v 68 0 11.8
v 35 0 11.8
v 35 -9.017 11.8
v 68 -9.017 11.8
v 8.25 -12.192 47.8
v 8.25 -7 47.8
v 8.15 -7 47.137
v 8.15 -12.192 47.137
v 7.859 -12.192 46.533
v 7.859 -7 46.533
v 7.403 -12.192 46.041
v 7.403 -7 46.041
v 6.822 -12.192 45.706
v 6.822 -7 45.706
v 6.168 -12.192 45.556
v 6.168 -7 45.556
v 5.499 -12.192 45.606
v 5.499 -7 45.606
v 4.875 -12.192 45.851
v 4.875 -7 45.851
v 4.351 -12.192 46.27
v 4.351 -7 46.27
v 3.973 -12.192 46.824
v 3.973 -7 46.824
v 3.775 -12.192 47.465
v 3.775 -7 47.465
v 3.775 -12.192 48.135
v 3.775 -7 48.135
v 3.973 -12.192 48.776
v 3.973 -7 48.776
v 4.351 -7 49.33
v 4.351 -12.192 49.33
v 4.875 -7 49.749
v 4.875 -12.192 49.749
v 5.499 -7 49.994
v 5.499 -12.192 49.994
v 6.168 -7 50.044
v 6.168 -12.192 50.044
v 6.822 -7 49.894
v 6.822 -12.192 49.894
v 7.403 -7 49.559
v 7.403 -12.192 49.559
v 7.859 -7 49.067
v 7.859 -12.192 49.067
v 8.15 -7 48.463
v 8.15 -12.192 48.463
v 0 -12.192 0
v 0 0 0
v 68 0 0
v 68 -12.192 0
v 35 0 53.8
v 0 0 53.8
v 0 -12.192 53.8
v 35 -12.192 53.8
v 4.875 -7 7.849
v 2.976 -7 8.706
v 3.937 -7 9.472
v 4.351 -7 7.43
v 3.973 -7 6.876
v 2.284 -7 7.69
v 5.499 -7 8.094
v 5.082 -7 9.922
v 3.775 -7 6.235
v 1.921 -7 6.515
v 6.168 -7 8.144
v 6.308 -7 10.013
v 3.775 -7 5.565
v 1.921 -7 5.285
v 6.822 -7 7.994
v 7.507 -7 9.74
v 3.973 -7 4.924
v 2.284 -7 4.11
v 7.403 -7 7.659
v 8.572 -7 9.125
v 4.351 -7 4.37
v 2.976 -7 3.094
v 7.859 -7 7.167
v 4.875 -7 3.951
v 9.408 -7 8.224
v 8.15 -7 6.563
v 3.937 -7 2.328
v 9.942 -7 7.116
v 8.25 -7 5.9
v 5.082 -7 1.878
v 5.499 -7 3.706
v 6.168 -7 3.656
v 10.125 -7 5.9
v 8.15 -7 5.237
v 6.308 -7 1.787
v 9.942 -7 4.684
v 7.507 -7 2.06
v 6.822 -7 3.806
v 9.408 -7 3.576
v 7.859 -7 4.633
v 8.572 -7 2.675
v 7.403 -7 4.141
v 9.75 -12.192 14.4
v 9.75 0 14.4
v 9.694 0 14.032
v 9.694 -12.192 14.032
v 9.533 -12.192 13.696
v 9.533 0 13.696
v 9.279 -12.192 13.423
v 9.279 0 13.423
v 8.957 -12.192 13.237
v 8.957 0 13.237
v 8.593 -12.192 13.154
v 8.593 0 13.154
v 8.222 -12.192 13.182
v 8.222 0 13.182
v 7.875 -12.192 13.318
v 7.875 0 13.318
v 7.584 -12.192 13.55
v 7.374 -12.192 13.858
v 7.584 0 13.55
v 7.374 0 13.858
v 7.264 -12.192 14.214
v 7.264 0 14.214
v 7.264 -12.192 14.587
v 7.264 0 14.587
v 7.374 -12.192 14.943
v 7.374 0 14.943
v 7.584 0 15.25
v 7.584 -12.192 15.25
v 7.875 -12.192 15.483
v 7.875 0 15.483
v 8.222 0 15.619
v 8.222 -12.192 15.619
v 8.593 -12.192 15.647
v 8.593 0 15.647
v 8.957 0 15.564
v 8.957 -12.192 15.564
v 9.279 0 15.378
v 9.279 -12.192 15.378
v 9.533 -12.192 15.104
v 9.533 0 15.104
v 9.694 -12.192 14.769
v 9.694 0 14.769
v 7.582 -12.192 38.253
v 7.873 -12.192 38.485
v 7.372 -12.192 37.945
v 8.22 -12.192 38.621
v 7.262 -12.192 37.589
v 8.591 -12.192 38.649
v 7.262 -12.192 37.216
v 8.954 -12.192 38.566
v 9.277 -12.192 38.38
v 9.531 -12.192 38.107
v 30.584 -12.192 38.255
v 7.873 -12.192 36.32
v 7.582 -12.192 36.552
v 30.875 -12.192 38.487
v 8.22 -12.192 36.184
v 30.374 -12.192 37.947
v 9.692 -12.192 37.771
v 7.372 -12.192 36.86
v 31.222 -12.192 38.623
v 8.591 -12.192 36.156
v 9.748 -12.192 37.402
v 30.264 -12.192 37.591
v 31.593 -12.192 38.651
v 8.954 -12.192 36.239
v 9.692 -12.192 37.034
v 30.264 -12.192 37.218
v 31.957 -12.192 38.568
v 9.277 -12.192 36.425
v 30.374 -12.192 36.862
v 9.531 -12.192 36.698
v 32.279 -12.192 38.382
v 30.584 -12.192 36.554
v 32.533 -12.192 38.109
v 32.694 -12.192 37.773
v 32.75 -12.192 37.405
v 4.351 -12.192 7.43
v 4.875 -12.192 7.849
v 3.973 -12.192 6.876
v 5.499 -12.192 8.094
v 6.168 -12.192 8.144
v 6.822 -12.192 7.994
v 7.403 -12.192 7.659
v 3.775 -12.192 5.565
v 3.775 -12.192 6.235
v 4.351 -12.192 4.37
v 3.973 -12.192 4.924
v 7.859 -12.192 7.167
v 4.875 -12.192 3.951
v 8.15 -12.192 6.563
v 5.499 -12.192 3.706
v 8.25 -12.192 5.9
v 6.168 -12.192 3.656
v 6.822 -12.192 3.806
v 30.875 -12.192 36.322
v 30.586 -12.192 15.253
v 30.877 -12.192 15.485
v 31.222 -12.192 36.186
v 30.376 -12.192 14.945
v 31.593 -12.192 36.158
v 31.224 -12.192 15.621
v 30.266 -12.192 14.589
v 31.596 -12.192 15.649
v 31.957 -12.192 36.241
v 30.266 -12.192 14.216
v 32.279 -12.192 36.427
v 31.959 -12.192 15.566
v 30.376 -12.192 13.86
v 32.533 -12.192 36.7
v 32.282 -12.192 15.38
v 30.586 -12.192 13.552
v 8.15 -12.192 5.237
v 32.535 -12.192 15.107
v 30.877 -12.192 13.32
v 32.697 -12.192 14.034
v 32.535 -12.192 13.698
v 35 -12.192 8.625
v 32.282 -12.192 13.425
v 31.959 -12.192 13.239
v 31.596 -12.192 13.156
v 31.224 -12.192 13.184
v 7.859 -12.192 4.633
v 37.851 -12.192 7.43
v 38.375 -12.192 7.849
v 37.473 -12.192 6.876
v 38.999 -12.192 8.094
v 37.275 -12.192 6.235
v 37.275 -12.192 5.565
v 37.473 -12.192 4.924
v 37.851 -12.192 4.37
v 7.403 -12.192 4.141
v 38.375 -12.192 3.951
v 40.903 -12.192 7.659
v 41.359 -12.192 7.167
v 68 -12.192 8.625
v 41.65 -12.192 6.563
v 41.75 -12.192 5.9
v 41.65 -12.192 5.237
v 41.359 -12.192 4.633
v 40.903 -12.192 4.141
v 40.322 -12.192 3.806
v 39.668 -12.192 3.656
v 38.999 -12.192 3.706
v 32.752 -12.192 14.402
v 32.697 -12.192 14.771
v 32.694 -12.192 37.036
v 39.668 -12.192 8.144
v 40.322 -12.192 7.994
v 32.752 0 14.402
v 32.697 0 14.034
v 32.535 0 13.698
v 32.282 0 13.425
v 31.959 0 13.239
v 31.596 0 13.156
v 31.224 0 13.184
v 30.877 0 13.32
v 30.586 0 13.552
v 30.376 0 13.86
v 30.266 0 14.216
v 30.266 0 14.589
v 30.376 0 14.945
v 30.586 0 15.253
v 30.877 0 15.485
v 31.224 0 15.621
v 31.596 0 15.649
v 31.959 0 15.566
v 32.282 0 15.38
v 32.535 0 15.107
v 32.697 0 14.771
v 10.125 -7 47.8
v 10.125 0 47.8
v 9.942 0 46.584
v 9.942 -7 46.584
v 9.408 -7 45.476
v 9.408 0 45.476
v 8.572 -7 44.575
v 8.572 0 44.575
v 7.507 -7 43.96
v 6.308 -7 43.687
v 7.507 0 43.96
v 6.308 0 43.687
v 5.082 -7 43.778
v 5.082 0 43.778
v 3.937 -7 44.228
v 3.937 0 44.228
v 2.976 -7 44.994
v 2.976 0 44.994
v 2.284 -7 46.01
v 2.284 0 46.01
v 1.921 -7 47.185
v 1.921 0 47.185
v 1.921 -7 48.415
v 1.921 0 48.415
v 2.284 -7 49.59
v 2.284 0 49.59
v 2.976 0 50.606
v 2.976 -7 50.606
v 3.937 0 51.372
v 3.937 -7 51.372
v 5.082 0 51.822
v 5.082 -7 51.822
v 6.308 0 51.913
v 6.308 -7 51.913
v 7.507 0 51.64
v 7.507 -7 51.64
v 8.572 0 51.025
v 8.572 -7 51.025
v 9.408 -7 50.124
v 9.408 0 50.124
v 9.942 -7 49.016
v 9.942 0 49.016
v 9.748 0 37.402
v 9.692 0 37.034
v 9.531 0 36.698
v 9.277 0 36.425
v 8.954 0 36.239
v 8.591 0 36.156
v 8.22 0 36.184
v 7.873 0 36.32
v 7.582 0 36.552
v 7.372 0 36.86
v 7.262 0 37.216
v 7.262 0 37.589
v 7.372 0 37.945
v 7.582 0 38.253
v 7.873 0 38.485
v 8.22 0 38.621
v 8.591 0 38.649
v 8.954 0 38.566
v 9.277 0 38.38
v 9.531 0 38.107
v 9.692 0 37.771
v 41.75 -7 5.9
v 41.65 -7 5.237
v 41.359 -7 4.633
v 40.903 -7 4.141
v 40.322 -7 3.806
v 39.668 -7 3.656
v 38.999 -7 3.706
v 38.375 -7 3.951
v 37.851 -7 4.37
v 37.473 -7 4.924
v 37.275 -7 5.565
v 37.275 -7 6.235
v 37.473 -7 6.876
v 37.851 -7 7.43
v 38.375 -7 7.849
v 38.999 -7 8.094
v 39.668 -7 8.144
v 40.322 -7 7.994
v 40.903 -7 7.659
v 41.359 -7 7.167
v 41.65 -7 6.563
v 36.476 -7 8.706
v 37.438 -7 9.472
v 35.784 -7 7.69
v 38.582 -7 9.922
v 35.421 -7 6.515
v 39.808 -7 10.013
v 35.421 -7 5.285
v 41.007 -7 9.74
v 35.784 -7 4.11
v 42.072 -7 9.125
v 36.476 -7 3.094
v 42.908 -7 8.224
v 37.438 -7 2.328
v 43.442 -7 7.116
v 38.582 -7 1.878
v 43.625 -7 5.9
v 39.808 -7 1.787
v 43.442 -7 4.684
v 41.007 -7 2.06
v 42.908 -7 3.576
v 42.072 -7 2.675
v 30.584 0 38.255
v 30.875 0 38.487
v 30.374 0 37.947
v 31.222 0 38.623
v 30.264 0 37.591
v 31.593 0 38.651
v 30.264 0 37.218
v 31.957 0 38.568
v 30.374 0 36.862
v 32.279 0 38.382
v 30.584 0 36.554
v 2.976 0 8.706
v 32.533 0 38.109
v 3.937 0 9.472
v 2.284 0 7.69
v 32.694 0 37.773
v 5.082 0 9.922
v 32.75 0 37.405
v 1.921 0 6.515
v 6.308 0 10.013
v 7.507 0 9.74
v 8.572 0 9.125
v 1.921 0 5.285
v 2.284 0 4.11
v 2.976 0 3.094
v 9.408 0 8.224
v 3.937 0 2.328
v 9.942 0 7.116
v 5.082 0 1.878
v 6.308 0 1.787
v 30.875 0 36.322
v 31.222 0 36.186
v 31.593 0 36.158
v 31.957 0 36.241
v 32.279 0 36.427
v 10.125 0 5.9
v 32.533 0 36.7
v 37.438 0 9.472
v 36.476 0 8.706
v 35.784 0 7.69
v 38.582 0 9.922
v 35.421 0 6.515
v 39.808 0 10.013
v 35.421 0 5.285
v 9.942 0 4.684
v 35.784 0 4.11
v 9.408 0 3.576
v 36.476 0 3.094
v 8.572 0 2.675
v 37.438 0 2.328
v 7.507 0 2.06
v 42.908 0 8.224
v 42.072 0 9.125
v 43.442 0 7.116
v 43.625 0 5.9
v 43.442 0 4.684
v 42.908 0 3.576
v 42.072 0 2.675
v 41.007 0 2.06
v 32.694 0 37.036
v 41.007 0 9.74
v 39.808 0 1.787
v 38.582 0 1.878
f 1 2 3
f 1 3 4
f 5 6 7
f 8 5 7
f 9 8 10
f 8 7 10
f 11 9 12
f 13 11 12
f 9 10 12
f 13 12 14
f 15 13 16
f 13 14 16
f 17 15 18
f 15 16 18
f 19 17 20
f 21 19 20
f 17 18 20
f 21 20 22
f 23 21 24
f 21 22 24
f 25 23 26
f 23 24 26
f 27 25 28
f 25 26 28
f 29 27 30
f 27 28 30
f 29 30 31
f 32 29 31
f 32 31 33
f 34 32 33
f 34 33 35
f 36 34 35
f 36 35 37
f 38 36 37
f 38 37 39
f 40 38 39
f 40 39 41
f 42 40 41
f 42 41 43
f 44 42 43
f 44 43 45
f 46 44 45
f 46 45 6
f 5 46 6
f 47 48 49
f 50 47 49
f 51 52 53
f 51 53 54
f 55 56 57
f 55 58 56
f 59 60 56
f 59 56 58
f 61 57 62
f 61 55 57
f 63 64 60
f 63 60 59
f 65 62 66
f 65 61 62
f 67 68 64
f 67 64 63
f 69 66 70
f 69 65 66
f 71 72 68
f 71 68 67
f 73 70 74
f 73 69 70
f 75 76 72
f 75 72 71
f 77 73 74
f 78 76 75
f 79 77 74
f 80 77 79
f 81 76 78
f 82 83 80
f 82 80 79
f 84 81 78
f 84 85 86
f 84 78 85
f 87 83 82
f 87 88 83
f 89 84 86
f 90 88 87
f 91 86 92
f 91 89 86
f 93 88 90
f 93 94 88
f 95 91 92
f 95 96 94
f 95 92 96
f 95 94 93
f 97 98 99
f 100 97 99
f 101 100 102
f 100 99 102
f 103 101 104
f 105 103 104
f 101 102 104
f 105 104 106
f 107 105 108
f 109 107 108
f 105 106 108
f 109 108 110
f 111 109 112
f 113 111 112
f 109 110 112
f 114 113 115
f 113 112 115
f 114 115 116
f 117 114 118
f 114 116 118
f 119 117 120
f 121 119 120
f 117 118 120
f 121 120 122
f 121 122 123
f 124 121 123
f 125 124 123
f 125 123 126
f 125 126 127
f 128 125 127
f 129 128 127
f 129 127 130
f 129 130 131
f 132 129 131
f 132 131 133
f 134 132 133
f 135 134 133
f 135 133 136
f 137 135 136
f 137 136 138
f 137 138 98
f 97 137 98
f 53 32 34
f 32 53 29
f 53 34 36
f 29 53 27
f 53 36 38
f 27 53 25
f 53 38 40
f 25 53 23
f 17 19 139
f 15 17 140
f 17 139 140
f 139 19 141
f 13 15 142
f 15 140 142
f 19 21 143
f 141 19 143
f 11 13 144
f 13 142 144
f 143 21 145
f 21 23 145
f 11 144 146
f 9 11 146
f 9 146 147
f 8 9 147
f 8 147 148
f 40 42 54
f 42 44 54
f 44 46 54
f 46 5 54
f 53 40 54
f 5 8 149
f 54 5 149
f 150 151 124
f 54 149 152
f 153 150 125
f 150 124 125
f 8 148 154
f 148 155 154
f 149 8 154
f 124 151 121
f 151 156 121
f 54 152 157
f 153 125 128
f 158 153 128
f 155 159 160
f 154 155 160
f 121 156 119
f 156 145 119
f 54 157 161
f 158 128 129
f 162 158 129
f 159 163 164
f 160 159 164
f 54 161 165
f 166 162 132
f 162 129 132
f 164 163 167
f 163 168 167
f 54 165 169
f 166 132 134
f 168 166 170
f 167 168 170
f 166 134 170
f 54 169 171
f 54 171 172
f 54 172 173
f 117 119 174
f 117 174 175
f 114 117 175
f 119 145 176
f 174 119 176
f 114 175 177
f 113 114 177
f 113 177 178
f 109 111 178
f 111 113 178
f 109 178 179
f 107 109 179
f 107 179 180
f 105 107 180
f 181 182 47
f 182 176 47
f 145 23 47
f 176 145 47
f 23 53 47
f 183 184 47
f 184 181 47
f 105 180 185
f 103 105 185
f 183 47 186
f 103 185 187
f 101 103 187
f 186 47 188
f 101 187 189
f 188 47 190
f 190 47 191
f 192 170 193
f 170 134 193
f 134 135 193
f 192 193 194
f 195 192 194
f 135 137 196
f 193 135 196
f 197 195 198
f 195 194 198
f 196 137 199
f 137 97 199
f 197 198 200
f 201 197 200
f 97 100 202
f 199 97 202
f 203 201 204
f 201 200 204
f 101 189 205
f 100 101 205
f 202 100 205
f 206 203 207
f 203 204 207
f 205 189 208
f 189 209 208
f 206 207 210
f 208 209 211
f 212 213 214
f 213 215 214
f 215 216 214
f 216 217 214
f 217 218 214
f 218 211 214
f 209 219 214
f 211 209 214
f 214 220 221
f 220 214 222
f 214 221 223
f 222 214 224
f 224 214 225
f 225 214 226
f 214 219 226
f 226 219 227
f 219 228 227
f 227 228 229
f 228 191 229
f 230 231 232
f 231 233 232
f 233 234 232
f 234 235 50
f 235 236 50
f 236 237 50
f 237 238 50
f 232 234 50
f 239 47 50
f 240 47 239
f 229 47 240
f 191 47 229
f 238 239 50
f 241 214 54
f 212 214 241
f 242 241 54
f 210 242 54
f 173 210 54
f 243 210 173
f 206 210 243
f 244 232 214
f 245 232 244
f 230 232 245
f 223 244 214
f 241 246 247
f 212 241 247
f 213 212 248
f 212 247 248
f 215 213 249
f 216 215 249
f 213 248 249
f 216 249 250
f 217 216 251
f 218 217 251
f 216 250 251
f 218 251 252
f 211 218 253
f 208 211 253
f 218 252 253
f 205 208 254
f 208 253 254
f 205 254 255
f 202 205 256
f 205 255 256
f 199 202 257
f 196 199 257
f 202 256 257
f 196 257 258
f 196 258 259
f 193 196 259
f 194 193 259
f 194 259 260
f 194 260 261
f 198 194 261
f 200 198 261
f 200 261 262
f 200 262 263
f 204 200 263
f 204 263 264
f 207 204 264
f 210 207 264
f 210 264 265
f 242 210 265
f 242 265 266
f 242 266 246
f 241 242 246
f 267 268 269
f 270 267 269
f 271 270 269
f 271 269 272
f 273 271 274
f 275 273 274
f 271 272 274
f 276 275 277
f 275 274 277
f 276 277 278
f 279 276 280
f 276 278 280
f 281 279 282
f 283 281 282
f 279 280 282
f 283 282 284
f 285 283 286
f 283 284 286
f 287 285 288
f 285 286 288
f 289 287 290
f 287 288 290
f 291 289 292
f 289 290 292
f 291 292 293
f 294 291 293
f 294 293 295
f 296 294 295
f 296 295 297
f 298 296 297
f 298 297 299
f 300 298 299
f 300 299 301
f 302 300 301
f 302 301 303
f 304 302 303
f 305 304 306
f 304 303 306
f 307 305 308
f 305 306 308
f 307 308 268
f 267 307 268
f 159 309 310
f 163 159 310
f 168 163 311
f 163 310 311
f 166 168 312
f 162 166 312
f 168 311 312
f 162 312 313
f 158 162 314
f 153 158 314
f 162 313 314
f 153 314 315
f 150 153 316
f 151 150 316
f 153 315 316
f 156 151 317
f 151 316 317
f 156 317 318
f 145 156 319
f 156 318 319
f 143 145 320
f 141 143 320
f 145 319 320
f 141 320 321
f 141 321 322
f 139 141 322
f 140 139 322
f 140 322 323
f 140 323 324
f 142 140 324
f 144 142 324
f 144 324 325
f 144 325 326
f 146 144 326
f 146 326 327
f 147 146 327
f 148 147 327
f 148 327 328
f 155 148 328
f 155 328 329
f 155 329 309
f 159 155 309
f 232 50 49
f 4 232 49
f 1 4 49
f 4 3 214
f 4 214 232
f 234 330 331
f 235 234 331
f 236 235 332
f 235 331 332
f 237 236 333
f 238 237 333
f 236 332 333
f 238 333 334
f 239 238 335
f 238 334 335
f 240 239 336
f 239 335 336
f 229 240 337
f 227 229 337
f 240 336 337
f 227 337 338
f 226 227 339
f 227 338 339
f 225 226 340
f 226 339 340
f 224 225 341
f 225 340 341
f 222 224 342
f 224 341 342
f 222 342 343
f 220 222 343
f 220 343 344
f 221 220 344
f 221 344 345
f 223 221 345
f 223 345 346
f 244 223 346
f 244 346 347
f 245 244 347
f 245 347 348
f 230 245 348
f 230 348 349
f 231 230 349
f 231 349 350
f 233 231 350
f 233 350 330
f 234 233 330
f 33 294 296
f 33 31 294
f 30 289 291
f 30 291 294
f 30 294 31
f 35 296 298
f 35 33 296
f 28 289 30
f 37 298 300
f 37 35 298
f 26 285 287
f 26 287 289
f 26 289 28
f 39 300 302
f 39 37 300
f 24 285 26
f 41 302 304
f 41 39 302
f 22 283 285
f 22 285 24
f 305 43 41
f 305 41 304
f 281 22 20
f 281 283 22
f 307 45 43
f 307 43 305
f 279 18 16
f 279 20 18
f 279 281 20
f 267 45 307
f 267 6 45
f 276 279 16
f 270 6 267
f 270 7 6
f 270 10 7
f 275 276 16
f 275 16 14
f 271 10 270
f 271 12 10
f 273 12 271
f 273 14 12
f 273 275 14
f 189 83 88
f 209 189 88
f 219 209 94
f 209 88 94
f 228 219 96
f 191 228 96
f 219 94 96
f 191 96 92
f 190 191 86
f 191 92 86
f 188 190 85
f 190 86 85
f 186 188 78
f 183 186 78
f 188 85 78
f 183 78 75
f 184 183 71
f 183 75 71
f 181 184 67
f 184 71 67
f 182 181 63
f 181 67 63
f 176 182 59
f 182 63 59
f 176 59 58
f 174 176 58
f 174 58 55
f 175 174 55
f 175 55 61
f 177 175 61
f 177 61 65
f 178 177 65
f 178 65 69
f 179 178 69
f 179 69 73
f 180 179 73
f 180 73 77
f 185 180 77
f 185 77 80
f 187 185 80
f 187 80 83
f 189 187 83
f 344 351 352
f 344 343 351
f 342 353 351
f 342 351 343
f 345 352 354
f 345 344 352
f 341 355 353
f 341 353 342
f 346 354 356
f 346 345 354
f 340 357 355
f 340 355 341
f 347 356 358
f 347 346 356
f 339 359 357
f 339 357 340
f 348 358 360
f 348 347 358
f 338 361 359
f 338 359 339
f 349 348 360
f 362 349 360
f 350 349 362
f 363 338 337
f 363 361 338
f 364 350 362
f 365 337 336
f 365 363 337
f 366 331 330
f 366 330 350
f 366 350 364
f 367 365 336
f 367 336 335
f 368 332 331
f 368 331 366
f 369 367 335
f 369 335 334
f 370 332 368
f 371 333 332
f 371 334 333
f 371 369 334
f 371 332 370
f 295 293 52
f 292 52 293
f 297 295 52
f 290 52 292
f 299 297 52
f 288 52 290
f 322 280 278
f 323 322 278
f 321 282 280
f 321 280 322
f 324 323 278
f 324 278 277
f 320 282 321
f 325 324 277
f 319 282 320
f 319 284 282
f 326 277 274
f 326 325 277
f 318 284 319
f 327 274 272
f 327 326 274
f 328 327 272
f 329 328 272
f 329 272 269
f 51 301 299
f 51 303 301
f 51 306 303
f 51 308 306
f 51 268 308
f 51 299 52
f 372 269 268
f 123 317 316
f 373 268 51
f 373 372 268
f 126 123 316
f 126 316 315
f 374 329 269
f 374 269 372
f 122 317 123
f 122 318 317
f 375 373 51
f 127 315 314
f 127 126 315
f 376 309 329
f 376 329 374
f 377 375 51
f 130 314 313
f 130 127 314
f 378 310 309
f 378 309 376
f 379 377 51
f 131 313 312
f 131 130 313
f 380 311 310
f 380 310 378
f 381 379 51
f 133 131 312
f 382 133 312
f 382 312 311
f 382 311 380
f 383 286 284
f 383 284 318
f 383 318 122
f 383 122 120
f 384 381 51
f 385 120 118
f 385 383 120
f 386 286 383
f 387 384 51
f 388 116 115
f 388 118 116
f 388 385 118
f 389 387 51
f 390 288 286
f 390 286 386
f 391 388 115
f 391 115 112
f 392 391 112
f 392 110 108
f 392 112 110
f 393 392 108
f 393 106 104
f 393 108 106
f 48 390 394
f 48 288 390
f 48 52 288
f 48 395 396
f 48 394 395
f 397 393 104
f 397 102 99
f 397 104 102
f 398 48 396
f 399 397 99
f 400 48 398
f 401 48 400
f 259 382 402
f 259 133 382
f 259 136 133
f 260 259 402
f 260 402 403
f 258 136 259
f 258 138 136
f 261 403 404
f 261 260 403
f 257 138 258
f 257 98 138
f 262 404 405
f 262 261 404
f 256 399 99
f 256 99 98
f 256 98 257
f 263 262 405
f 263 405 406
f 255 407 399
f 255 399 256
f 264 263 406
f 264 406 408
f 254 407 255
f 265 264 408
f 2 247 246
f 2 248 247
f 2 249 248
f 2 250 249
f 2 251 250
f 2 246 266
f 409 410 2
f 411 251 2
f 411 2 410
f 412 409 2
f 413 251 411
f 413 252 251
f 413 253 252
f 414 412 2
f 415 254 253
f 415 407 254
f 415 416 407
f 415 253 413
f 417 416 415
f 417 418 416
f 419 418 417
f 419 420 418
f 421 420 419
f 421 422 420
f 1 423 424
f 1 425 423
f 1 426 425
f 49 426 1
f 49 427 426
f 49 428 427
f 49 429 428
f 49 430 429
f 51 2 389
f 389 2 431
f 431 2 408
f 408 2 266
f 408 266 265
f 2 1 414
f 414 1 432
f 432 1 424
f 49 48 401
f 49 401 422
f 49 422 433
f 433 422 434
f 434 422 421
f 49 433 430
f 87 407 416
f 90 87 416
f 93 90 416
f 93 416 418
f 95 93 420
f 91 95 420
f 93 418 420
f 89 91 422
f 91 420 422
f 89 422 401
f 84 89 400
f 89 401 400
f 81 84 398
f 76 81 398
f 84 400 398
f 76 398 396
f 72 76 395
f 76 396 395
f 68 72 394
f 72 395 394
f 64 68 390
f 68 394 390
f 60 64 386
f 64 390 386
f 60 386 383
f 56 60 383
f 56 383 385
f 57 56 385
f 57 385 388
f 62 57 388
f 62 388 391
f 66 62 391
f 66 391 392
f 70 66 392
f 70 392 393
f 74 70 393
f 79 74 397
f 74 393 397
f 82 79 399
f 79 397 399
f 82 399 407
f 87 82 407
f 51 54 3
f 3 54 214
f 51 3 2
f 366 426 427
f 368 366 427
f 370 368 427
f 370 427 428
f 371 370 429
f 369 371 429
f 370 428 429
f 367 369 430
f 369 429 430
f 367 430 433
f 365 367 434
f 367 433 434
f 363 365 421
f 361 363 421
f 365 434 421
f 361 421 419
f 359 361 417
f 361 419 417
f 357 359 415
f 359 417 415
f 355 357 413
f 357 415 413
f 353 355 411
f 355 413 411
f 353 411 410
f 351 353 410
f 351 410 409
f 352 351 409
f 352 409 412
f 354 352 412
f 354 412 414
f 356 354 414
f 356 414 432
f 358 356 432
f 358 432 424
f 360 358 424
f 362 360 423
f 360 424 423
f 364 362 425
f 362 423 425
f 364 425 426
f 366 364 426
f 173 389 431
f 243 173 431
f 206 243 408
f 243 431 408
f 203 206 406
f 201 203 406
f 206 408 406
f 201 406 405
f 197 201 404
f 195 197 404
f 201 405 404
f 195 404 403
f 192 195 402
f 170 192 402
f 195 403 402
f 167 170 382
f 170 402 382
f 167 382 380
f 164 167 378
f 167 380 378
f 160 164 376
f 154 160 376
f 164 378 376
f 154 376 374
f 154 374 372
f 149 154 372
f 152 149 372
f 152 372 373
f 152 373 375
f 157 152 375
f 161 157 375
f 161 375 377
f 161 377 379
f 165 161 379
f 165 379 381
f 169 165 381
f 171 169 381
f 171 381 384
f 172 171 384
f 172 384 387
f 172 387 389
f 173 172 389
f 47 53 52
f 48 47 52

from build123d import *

# Parameters (mm, degrees)
SKETCH1_W           = 68
SKETCH1_H           = 12.192
BOSS_EXTRUDE1_DEPTH = 11.8
SKETCH2_R           = 2.25
CUT_EXTRUDE1_DEPTH  = 13.192
SKETCH3_R           = 4.125
CUT_EXTRUDE2_DEPTH  = 7
SKETCH4_W           = 35
SKETCH4_H           = 12.192
BOSS_EXTRUDE2_DEPTH = 42
SKETCH5_R           = 2.25
CUT_EXTRUDE3_DEPTH  = 13.192
SKETCH6_R           = 4.125
CUT_EXTRUDE4_DEPTH  = 7
CUT_EXTRUDE5_REACH  = 14.192
SKETCH7_R           = 1.25
CHAMFER1_SIZE       = 3.175


with BuildPart() as part:
    # Sketch1 → Boss-Extrude1 (new body)
    with BuildSketch(Plane.XY):
        with Locations((34, -6.096)):
            Rectangle(SKETCH1_W, SKETCH1_H)
    extrude(amount=BOSS_EXTRUDE1_DEPTH)

    # Sketch2 → Cut-Extrude1 (cut, through all)
    with BuildSketch(Plane(origin=(0, 0, 0), x_dir=(1, 0, 0), z_dir=(0, 1, 0))):
        with Locations((39.5, -5.9)):
            Circle(SKETCH2_R)
        with Locations((6, -5.9)):
            Circle(SKETCH2_R)
    extrude(amount=-CUT_EXTRUDE1_DEPTH, mode=Mode.SUBTRACT)

    # Sketch3 → Cut-Extrude2 (cut)
    with BuildSketch(Plane(origin=(0, 0, 0), x_dir=(1, 0, 0), z_dir=(0, 1, 0))):
        with Locations((39.5, -5.9)):
            Circle(SKETCH3_R)
        with Locations((6, -5.9)):
            Circle(SKETCH3_R)
    extrude(amount=-CUT_EXTRUDE2_DEPTH, mode=Mode.SUBTRACT)

    # Sketch4 → Boss-Extrude2 (add)
    with BuildSketch(Plane.XY.offset(11.8)):
        with Locations((17.5, -6.096)):
            Rectangle(SKETCH4_W, SKETCH4_H)
    extrude(amount=BOSS_EXTRUDE2_DEPTH)

    # Sketch5 → Cut-Extrude3 (cut, through all)
    with BuildSketch(Plane(origin=(0, 0, 0), x_dir=(1, 0, 0), z_dir=(0, 1, 0))):
        with Locations((6, -47.8)):
            Circle(SKETCH5_R)
    extrude(amount=-CUT_EXTRUDE3_DEPTH, mode=Mode.SUBTRACT)

    # Sketch6 → Cut-Extrude4 (cut)
    with BuildSketch(Plane(origin=(0, 0, 0), x_dir=(1, 0, 0), z_dir=(0, 1, 0))):
        with Locations((6, -47.8)):
            Circle(SKETCH6_R)
    extrude(amount=-CUT_EXTRUDE4_DEPTH, mode=Mode.SUBTRACT)

    # Sketch7 → Cut-Extrude5 (cut, up to next)
    with BuildSketch(Plane(origin=(0, 0, 0), x_dir=(1, 0, 0), z_dir=(0, 1, 0)), mode=Mode.PRIVATE) as cut_extrude5_sk1:
        with Locations((8.5, -14.400241512)):
            Circle(SKETCH7_R)
    cut_extrude5_tool1 = extrude(cut_extrude5_sk1.sketch, amount=-CUT_EXTRUDE5_REACH, mode=Mode.PRIVATE) & part.part
    add(cut_extrude5_tool1.solids().sort_by_distance((8.5, 0, 14.400242))[0], mode=Mode.SUBTRACT)
    # Sketch7 → Cut-Extrude5 (cut, up to next)
    with BuildSketch(Plane(origin=(0, 0, 0), x_dir=(1, 0, 0), z_dir=(0, 1, 0)), mode=Mode.PRIVATE) as cut_extrude5_sk2:
        with Locations((8.497816512, -37.402425)):
            Circle(SKETCH7_R)
    cut_extrude5_tool2 = extrude(cut_extrude5_sk2.sketch, amount=-CUT_EXTRUDE5_REACH, mode=Mode.PRIVATE) & part.part
    add(cut_extrude5_tool2.solids().sort_by_distance((8.497817, 0, 37.402425))[0], mode=Mode.SUBTRACT)
    # Sketch7 → Cut-Extrude5 (cut, up to next)
    with BuildSketch(Plane(origin=(0, 0, 0), x_dir=(1, 0, 0), z_dir=(0, 1, 0)), mode=Mode.PRIVATE) as cut_extrude5_sk3:
        with Locations((31.5, -37.404608488)):
            Circle(SKETCH7_R)
    cut_extrude5_tool3 = extrude(cut_extrude5_sk3.sketch, amount=-CUT_EXTRUDE5_REACH, mode=Mode.PRIVATE) & part.part
    add(cut_extrude5_tool3.solids().sort_by_distance((31.5, 0, 37.404608))[0], mode=Mode.SUBTRACT)
    # Sketch7 → Cut-Extrude5 (cut, up to next)
    with BuildSketch(Plane(origin=(0, 0, 0), x_dir=(1, 0, 0), z_dir=(0, 1, 0)), mode=Mode.PRIVATE) as cut_extrude5_sk4:
        with Locations((31.502183488, -14.402425)):
            Circle(SKETCH7_R)
    cut_extrude5_tool4 = extrude(cut_extrude5_sk4.sketch, amount=-CUT_EXTRUDE5_REACH, mode=Mode.PRIVATE) & part.part
    add(cut_extrude5_tool4.solids().sort_by_distance((31.502183, 0, 14.402425))[0], mode=Mode.SUBTRACT)

    # Chamfer1
    chamfer1_edges = [part.edges().sort_by_distance(p)[0] for p in [
        (51.5, -12.192, 11.8),
    ]]
    chamfer(chamfer1_edges, length=CHAMFER1_SIZE)


solid = part.part
